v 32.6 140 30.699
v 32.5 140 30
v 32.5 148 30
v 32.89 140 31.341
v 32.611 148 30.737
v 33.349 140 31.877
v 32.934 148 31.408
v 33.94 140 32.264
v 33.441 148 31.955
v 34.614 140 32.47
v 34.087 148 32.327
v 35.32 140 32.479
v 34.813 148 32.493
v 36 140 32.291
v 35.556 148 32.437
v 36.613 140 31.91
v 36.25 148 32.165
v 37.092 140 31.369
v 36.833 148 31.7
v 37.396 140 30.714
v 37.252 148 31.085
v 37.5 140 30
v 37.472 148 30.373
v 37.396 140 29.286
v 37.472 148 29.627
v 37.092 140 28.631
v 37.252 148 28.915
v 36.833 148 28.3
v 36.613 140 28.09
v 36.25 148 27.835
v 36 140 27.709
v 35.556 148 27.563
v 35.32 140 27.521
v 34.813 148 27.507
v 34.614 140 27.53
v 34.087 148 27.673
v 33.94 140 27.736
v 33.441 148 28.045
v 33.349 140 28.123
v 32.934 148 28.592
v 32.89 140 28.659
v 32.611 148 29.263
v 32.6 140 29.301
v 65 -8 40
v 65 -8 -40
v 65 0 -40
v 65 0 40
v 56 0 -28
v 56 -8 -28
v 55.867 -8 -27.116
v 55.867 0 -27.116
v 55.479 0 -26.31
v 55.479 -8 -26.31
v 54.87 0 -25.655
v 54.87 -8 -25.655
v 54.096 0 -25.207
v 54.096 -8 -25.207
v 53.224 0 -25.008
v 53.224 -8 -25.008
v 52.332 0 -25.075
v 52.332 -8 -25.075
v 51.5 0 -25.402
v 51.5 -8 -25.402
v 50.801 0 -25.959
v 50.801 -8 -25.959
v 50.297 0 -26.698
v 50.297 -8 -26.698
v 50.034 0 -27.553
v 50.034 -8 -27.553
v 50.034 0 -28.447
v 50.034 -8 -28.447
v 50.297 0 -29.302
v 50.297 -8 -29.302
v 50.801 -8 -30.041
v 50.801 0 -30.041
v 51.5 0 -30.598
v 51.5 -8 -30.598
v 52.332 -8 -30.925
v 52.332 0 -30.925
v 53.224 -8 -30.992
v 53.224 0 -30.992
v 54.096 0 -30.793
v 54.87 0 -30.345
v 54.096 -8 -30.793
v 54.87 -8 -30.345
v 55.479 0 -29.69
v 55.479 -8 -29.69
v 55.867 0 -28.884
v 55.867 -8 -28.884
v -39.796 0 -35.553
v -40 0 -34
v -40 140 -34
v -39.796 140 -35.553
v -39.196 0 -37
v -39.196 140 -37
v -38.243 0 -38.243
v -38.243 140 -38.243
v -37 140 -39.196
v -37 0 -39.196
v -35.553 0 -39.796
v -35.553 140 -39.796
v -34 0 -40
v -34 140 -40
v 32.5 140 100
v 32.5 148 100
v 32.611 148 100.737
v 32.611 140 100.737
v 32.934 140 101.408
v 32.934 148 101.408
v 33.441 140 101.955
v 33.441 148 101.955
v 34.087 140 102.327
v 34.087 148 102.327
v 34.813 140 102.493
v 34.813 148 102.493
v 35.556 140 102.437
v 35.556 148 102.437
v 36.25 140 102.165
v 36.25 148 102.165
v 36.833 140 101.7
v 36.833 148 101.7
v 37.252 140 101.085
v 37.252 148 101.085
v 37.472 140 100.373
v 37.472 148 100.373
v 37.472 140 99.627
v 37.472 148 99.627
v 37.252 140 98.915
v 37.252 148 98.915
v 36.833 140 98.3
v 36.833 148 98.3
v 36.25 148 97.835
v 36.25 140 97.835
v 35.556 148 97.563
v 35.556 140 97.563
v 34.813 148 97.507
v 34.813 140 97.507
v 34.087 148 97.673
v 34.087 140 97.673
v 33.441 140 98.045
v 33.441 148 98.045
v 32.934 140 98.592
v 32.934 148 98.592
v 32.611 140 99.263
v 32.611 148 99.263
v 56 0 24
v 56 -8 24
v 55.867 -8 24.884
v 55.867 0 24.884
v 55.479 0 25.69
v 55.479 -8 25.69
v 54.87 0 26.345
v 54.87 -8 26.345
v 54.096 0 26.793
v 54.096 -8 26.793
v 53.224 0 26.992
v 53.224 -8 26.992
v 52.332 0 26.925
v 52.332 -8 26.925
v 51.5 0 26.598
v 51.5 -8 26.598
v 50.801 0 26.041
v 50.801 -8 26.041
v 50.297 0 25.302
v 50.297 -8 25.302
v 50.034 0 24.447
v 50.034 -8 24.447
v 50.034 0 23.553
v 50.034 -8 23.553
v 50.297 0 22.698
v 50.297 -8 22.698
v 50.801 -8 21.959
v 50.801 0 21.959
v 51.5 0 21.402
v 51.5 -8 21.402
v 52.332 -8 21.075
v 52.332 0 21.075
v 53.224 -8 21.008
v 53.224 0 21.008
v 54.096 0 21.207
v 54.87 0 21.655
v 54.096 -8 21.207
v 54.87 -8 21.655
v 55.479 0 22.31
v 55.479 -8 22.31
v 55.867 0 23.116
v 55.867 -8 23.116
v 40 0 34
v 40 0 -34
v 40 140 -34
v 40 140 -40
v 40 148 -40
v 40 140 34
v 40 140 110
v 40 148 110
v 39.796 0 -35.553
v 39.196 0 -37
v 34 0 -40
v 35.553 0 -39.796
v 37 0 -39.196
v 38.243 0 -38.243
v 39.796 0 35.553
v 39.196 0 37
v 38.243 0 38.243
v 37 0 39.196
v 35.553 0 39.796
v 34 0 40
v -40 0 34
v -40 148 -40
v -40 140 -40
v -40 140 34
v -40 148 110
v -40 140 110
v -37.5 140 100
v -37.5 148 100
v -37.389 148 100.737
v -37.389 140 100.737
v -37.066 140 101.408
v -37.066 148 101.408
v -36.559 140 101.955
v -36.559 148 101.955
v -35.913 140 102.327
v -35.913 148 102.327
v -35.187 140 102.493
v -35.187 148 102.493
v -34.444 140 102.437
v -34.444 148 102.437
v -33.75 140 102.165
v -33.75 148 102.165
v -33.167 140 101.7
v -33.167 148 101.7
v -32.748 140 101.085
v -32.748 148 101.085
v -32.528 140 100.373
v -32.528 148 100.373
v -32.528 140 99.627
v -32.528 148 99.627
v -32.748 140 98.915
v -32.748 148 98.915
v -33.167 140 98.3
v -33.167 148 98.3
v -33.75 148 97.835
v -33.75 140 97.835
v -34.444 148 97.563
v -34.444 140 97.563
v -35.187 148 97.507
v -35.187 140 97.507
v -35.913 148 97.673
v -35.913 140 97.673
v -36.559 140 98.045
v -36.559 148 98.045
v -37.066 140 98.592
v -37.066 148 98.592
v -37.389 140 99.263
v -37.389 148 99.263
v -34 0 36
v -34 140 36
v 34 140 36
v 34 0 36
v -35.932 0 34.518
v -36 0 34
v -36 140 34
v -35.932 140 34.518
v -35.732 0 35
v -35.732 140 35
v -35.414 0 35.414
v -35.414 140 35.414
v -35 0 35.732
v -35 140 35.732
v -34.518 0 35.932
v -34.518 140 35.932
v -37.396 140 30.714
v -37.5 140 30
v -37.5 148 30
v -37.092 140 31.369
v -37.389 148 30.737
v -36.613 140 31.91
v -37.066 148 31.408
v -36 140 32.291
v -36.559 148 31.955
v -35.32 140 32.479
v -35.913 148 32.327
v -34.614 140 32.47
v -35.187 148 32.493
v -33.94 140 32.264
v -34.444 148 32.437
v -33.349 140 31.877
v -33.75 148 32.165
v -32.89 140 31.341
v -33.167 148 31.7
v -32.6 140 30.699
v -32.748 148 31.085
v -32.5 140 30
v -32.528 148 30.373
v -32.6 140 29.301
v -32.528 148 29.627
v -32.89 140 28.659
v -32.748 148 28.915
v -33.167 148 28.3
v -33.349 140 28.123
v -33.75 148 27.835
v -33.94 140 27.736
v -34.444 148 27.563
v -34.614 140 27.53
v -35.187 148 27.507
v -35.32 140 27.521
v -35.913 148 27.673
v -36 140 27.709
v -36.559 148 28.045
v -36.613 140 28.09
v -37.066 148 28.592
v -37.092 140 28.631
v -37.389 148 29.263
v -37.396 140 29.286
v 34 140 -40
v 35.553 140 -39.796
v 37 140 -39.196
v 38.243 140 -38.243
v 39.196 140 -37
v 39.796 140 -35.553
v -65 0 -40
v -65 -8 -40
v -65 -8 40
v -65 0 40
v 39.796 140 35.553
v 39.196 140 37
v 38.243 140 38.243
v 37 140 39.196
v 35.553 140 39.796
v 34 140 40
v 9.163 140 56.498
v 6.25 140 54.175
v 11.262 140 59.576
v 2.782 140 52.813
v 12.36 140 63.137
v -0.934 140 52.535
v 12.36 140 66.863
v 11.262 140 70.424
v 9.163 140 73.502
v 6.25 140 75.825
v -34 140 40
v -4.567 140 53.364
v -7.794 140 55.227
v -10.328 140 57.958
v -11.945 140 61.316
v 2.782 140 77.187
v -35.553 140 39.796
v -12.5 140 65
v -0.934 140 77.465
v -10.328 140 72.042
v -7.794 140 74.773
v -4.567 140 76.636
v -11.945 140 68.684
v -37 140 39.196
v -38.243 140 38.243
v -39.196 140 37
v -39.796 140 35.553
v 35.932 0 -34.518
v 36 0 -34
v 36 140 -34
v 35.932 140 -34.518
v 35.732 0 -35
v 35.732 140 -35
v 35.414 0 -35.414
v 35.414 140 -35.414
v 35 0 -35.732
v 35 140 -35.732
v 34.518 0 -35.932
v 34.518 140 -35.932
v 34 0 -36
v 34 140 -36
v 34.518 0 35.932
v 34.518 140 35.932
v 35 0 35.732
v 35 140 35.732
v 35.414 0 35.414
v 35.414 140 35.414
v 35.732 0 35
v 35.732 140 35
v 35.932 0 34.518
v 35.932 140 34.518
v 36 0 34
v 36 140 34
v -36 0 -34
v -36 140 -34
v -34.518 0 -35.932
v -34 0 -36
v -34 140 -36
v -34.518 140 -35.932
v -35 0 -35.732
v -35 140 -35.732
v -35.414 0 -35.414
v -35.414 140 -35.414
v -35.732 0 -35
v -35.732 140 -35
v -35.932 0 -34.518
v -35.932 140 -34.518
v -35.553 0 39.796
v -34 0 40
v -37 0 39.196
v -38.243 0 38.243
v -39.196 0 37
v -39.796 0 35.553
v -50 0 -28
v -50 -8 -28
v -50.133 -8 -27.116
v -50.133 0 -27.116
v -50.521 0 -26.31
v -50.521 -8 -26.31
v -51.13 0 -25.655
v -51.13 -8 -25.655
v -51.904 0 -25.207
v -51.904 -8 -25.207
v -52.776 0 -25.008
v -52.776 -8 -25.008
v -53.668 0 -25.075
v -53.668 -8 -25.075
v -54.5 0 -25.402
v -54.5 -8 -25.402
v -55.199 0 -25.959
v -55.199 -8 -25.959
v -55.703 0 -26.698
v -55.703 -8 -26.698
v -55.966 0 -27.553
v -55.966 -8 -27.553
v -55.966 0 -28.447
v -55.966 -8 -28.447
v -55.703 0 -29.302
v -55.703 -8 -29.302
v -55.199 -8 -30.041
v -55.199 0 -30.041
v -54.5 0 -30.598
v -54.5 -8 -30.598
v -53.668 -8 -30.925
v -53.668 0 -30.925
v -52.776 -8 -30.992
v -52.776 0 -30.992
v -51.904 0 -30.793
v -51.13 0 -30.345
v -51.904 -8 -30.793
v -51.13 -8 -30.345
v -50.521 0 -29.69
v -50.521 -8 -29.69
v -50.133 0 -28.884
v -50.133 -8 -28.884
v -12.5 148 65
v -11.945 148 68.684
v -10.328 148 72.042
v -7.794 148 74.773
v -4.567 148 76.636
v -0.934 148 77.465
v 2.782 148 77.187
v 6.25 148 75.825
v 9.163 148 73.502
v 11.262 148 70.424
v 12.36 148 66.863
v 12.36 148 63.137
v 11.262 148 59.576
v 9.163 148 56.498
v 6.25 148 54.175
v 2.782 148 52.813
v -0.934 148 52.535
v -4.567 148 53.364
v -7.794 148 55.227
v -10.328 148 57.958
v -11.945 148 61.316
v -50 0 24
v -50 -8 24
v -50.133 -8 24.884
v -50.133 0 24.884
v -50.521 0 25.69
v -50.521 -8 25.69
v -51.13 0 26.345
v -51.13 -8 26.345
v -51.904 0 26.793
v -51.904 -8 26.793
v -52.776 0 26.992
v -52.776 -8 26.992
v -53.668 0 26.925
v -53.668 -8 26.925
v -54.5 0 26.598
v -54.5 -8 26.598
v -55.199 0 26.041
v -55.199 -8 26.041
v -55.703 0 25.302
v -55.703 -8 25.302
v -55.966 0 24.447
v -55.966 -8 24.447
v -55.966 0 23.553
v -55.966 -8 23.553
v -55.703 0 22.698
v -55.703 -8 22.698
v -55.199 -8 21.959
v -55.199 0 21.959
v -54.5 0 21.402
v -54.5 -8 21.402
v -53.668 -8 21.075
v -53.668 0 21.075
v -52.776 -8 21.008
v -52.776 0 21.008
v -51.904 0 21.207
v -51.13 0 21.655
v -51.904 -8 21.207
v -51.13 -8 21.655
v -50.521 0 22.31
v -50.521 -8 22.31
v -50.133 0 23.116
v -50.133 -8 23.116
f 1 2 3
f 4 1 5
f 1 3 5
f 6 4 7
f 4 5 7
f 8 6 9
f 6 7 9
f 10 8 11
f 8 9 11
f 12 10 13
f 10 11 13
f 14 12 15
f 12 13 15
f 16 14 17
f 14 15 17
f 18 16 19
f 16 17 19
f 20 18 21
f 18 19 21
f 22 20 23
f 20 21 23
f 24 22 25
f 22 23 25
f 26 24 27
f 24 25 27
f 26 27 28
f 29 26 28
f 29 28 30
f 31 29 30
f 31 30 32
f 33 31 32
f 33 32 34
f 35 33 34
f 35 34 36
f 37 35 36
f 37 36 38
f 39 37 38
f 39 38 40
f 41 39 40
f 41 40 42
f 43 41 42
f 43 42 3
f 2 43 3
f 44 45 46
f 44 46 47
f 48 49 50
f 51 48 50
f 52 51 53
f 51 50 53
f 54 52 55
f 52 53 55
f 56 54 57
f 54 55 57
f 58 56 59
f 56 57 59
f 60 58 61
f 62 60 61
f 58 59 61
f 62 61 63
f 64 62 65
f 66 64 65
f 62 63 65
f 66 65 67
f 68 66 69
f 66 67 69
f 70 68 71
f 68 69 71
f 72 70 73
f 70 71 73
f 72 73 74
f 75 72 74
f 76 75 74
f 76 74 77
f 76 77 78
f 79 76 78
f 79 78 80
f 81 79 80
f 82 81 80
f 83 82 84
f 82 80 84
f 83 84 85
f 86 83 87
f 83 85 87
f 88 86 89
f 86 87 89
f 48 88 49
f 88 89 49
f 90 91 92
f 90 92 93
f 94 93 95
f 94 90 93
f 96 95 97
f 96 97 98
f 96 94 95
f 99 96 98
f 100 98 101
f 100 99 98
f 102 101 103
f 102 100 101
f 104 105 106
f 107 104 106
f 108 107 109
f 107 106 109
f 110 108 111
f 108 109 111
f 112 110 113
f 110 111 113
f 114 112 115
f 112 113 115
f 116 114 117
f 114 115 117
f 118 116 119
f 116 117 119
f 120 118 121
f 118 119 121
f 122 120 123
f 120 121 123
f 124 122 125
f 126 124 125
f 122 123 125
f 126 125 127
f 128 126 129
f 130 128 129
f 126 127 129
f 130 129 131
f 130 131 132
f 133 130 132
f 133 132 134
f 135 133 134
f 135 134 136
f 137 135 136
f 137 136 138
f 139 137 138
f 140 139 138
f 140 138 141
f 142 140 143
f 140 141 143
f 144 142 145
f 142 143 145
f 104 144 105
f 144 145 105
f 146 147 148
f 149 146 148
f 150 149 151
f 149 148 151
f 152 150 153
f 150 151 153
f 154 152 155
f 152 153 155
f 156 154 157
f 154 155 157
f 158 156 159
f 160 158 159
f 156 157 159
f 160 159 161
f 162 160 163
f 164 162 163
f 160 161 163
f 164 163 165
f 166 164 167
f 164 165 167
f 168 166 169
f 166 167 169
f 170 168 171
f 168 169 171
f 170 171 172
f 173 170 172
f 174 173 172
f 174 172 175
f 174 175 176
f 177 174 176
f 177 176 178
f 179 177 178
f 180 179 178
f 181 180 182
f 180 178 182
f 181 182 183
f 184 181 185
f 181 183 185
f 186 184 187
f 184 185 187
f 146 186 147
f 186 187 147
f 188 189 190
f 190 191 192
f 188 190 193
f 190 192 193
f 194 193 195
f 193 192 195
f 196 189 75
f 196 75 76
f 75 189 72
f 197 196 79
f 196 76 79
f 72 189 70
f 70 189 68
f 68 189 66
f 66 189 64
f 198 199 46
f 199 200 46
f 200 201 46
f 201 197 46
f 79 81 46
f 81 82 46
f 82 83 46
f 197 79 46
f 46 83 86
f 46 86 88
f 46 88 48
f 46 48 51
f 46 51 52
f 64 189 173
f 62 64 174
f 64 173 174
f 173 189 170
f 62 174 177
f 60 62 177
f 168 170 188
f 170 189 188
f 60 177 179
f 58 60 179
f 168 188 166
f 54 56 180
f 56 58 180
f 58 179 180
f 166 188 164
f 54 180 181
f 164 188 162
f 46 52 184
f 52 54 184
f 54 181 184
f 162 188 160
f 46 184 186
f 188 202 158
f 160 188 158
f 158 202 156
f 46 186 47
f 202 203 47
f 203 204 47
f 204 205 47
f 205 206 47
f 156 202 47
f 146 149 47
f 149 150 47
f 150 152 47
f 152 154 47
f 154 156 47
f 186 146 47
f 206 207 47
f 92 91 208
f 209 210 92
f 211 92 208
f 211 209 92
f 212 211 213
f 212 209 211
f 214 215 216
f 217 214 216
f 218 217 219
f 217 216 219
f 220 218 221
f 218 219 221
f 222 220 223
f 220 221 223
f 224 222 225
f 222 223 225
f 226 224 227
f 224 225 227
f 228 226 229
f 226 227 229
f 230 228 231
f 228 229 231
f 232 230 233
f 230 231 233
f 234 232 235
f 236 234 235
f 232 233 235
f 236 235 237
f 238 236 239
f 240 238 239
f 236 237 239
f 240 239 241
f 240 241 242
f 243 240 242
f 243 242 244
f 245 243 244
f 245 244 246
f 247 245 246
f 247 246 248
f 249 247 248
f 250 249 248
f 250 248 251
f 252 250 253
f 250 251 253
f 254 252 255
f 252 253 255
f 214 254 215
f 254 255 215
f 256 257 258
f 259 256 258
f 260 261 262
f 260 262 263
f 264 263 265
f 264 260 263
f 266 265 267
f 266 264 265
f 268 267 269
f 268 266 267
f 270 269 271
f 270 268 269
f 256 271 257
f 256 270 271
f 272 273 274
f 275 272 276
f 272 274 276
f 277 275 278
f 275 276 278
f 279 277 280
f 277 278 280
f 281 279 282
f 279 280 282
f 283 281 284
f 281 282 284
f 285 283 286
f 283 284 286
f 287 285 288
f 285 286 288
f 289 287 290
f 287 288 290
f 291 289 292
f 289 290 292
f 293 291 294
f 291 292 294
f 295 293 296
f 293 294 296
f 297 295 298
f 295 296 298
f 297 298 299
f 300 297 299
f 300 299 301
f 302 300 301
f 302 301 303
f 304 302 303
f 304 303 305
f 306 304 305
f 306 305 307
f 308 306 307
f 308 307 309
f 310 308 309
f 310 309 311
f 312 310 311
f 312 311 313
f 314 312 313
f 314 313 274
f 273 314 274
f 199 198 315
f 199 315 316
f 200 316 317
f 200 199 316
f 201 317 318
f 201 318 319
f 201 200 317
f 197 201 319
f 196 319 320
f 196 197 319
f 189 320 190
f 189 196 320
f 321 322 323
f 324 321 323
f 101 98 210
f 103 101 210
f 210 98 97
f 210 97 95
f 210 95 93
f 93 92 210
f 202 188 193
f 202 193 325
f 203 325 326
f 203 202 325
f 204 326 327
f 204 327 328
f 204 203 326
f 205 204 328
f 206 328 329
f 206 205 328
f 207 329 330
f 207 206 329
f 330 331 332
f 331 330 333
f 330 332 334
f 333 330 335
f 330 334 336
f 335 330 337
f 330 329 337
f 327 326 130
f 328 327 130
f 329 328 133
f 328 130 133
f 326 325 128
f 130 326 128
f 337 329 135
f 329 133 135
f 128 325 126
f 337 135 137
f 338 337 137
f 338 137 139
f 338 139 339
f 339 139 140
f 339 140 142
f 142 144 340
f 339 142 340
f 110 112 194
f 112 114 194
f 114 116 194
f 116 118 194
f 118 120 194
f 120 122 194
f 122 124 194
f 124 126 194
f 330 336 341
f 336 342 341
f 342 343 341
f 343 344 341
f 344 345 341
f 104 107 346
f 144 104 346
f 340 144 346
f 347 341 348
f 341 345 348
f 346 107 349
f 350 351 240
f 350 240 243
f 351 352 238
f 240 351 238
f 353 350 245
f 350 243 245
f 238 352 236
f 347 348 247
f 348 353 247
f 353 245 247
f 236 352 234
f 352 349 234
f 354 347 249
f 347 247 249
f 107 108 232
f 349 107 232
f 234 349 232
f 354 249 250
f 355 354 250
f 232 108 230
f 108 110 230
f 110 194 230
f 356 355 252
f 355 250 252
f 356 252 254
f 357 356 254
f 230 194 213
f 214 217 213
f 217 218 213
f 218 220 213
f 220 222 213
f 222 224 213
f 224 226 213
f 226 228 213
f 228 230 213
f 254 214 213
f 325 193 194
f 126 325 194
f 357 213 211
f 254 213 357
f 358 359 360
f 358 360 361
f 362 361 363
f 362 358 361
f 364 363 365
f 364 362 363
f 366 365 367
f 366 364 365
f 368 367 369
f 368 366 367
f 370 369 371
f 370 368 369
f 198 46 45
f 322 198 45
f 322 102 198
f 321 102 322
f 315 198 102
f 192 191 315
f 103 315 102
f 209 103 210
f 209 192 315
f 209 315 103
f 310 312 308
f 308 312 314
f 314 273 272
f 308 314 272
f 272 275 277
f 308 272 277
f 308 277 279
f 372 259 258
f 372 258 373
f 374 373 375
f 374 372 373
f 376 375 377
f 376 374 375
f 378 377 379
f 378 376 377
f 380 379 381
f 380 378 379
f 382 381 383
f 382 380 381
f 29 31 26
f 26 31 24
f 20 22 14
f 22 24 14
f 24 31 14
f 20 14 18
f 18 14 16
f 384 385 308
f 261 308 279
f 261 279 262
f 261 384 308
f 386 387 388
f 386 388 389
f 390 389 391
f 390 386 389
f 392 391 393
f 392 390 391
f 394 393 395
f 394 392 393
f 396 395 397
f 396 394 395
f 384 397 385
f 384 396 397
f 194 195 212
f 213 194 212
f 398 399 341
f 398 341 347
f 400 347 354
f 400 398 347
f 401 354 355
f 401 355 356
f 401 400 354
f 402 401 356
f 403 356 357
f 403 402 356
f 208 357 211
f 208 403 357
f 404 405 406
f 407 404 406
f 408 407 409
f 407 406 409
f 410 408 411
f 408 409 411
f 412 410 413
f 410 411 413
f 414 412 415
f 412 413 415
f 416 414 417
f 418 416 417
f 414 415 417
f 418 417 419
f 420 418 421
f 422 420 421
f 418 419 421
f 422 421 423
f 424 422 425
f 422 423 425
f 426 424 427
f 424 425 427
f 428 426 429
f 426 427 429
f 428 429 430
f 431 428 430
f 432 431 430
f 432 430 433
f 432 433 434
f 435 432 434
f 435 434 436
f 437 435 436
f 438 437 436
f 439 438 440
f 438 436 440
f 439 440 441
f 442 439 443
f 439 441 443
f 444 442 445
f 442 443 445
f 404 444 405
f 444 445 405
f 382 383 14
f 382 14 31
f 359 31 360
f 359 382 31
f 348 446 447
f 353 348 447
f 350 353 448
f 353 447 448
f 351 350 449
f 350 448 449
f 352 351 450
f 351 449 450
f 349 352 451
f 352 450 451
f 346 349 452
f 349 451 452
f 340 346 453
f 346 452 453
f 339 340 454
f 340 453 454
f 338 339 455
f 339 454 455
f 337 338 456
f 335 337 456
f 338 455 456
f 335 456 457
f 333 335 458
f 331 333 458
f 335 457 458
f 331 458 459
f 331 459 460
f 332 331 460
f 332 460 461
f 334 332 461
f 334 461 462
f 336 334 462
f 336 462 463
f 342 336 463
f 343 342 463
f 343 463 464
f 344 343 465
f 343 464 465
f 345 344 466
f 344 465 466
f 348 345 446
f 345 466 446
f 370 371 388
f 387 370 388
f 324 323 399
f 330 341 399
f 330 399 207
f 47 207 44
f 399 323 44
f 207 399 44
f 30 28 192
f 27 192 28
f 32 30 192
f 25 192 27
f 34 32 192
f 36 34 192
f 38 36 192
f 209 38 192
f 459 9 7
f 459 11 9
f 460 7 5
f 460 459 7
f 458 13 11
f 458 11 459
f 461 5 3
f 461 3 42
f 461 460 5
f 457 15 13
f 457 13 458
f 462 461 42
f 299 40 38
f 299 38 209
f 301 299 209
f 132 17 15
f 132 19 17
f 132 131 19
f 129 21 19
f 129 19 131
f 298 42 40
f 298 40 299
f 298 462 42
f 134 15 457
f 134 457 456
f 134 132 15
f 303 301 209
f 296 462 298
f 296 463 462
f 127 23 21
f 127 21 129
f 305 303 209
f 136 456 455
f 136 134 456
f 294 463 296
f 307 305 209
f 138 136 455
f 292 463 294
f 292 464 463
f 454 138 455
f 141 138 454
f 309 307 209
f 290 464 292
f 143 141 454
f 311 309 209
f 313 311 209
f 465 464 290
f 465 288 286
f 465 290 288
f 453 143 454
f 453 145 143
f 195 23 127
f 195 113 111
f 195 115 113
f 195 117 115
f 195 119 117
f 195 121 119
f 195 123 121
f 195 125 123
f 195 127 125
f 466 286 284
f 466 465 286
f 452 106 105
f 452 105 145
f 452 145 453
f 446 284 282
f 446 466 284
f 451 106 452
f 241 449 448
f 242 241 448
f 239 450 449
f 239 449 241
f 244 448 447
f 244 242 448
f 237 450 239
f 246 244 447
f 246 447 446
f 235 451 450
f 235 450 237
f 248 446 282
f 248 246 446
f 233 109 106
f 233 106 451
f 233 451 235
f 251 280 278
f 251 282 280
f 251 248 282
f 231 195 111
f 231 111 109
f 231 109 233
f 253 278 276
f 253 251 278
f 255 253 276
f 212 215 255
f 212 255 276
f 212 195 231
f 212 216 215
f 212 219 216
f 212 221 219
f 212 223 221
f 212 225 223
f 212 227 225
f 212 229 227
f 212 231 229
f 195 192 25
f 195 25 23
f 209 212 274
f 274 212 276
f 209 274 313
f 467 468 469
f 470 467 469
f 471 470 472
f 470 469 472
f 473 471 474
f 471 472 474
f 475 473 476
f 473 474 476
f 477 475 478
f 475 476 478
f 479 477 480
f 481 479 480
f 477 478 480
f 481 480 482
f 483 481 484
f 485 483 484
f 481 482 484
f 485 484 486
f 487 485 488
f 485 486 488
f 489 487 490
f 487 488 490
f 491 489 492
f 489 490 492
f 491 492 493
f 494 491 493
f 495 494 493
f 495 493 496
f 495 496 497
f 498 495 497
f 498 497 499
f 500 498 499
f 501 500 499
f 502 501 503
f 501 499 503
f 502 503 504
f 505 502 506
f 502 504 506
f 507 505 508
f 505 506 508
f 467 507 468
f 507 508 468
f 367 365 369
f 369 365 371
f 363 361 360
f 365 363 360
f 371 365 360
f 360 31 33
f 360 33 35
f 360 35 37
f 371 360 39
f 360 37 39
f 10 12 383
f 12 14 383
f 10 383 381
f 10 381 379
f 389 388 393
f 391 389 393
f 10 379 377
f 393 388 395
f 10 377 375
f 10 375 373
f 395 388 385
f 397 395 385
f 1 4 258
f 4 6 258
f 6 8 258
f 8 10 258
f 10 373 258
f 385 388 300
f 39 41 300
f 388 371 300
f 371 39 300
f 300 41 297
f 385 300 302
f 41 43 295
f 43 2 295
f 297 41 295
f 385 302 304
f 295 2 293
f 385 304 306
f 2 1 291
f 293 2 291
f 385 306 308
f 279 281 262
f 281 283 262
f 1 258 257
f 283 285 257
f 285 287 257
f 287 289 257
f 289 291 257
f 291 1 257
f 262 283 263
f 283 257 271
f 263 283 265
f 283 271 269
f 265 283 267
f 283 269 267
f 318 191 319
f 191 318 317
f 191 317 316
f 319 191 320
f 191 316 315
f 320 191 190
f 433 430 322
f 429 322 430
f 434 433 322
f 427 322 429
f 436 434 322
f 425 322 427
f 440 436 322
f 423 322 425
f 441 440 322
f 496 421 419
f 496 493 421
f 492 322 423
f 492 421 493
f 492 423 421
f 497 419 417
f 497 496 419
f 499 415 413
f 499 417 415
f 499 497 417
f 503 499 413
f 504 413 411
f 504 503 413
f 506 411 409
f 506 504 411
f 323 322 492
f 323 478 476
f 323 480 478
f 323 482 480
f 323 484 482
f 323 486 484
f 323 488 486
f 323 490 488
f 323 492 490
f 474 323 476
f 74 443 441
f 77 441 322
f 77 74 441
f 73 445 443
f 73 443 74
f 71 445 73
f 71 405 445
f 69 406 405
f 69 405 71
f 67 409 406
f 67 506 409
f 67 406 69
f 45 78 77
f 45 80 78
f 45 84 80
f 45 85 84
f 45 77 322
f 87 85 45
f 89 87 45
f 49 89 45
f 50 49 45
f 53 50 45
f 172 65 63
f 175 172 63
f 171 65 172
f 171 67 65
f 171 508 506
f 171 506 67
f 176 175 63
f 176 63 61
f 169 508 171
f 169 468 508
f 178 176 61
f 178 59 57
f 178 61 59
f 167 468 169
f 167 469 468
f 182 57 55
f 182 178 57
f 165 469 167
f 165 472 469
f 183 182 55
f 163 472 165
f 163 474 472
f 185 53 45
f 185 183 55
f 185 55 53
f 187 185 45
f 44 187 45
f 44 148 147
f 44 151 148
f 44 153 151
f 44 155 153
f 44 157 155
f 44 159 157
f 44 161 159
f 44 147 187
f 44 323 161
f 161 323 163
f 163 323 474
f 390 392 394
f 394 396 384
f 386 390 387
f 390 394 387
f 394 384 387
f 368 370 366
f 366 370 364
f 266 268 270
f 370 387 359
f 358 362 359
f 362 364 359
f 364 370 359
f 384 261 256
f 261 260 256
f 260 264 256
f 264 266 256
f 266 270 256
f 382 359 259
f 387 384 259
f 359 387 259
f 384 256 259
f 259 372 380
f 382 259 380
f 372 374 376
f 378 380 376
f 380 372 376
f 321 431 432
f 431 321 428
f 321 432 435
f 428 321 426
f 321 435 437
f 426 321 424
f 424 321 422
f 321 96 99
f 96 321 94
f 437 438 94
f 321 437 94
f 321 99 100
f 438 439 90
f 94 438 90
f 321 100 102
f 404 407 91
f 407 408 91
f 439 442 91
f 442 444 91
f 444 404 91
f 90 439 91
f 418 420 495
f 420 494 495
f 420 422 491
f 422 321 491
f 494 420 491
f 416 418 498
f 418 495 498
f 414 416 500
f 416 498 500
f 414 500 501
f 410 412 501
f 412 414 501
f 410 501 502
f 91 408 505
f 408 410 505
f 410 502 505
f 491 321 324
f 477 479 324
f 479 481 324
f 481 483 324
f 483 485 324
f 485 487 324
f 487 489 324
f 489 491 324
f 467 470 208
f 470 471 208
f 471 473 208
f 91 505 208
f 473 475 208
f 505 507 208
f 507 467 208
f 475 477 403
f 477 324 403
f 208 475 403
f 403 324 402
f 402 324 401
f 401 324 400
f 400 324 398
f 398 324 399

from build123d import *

# Parameters (mm, degrees)
F1_DEPTH = 140
F3_W     = 130
F3_H     = 80
F3_R     = 3
F4_DEPTH = 8
F6_W     = 80
F6_H     = 150
F6_R     = 2.5
F6_R_2   = 12.5
F7_DEPTH = 8


with BuildPart() as f1:
    # F0 (on Front) → F1 (new body)
    with BuildSketch(Plane.XZ):
        with BuildLine():
            ThreePointArc((40, 34), (38.2426406871, 38.2426406871), (34, 40))
            Line((34, 40), (-34, 40))
            ThreePointArc((-34, 40), (-38.2426406871, 38.2426406871), (-40, 34))
            Line((-40, 34), (-40, -34))
            ThreePointArc((-40, -34), (-38.2426406871, -38.2426406871), (-34, -40))
            Line((-34, -40), (34, -40))
            ThreePointArc((34, -40), (38.2426406871, -38.2426406871), (40, -34))
            Line((40, -34), (40, 34))
        make_face()
        with BuildLine():
            ThreePointArc((-36, 34), (-35.4142135624, 35.4142135624), (-34, 36))
            Line((-34, 36), (34, 36))
            ThreePointArc((34, 36), (35.4142135624, 35.4142135624), (36, 34))
            Line((36, 34), (36, -34))
            ThreePointArc((36, -34), (35.4142135624, -35.4142135624), (34, -36))
            Line((34, -36), (-34, -36))
            ThreePointArc((-34, -36), (-35.4142135624, -35.4142135624), (-36, -34))
            Line((-36, -34), (-36, 34))
        make_face(mode=Mode.SUBTRACT)
    extrude(amount=-F1_DEPTH)

    # F3 (on offset) → F4 (join)
    with BuildSketch(Plane.XZ.offset(8)):
        Rectangle(F3_W, F3_H)
        with Locations((-53, -28)):
            Circle(F3_R, mode=Mode.SUBTRACT)
        with Locations((53, -28)):
            Circle(F3_R, mode=Mode.SUBTRACT)
        with Locations((-53, 24)):
            Circle(F3_R, mode=Mode.SUBTRACT)
        with Locations((53, 24)):
            Circle(F3_R, mode=Mode.SUBTRACT)
    extrude(amount=-F4_DEPTH)

    # F6 (on offset) → F7 (join)
    with BuildSketch(Plane(origin=(0, 148, 0), x_dir=(-1, 0, 0), z_dir=(0, 1, 0))):
        with Locations((0, 35)):
            Rectangle(F6_W, F6_H)
        with Locations((-35, 30)):
            Circle(F6_R, mode=Mode.SUBTRACT)
        with Locations((35, 30)):
            Circle(F6_R, mode=Mode.SUBTRACT)
        with Locations((-35, 100)):
            Circle(F6_R, mode=Mode.SUBTRACT)
        with Locations((0, 65)):
            Circle(F6_R_2, mode=Mode.SUBTRACT)
        with Locations((35, 100)):
            Circle(F6_R, mode=Mode.SUBTRACT)
    extrude(amount=-F7_DEPTH)


solid = f1.part
